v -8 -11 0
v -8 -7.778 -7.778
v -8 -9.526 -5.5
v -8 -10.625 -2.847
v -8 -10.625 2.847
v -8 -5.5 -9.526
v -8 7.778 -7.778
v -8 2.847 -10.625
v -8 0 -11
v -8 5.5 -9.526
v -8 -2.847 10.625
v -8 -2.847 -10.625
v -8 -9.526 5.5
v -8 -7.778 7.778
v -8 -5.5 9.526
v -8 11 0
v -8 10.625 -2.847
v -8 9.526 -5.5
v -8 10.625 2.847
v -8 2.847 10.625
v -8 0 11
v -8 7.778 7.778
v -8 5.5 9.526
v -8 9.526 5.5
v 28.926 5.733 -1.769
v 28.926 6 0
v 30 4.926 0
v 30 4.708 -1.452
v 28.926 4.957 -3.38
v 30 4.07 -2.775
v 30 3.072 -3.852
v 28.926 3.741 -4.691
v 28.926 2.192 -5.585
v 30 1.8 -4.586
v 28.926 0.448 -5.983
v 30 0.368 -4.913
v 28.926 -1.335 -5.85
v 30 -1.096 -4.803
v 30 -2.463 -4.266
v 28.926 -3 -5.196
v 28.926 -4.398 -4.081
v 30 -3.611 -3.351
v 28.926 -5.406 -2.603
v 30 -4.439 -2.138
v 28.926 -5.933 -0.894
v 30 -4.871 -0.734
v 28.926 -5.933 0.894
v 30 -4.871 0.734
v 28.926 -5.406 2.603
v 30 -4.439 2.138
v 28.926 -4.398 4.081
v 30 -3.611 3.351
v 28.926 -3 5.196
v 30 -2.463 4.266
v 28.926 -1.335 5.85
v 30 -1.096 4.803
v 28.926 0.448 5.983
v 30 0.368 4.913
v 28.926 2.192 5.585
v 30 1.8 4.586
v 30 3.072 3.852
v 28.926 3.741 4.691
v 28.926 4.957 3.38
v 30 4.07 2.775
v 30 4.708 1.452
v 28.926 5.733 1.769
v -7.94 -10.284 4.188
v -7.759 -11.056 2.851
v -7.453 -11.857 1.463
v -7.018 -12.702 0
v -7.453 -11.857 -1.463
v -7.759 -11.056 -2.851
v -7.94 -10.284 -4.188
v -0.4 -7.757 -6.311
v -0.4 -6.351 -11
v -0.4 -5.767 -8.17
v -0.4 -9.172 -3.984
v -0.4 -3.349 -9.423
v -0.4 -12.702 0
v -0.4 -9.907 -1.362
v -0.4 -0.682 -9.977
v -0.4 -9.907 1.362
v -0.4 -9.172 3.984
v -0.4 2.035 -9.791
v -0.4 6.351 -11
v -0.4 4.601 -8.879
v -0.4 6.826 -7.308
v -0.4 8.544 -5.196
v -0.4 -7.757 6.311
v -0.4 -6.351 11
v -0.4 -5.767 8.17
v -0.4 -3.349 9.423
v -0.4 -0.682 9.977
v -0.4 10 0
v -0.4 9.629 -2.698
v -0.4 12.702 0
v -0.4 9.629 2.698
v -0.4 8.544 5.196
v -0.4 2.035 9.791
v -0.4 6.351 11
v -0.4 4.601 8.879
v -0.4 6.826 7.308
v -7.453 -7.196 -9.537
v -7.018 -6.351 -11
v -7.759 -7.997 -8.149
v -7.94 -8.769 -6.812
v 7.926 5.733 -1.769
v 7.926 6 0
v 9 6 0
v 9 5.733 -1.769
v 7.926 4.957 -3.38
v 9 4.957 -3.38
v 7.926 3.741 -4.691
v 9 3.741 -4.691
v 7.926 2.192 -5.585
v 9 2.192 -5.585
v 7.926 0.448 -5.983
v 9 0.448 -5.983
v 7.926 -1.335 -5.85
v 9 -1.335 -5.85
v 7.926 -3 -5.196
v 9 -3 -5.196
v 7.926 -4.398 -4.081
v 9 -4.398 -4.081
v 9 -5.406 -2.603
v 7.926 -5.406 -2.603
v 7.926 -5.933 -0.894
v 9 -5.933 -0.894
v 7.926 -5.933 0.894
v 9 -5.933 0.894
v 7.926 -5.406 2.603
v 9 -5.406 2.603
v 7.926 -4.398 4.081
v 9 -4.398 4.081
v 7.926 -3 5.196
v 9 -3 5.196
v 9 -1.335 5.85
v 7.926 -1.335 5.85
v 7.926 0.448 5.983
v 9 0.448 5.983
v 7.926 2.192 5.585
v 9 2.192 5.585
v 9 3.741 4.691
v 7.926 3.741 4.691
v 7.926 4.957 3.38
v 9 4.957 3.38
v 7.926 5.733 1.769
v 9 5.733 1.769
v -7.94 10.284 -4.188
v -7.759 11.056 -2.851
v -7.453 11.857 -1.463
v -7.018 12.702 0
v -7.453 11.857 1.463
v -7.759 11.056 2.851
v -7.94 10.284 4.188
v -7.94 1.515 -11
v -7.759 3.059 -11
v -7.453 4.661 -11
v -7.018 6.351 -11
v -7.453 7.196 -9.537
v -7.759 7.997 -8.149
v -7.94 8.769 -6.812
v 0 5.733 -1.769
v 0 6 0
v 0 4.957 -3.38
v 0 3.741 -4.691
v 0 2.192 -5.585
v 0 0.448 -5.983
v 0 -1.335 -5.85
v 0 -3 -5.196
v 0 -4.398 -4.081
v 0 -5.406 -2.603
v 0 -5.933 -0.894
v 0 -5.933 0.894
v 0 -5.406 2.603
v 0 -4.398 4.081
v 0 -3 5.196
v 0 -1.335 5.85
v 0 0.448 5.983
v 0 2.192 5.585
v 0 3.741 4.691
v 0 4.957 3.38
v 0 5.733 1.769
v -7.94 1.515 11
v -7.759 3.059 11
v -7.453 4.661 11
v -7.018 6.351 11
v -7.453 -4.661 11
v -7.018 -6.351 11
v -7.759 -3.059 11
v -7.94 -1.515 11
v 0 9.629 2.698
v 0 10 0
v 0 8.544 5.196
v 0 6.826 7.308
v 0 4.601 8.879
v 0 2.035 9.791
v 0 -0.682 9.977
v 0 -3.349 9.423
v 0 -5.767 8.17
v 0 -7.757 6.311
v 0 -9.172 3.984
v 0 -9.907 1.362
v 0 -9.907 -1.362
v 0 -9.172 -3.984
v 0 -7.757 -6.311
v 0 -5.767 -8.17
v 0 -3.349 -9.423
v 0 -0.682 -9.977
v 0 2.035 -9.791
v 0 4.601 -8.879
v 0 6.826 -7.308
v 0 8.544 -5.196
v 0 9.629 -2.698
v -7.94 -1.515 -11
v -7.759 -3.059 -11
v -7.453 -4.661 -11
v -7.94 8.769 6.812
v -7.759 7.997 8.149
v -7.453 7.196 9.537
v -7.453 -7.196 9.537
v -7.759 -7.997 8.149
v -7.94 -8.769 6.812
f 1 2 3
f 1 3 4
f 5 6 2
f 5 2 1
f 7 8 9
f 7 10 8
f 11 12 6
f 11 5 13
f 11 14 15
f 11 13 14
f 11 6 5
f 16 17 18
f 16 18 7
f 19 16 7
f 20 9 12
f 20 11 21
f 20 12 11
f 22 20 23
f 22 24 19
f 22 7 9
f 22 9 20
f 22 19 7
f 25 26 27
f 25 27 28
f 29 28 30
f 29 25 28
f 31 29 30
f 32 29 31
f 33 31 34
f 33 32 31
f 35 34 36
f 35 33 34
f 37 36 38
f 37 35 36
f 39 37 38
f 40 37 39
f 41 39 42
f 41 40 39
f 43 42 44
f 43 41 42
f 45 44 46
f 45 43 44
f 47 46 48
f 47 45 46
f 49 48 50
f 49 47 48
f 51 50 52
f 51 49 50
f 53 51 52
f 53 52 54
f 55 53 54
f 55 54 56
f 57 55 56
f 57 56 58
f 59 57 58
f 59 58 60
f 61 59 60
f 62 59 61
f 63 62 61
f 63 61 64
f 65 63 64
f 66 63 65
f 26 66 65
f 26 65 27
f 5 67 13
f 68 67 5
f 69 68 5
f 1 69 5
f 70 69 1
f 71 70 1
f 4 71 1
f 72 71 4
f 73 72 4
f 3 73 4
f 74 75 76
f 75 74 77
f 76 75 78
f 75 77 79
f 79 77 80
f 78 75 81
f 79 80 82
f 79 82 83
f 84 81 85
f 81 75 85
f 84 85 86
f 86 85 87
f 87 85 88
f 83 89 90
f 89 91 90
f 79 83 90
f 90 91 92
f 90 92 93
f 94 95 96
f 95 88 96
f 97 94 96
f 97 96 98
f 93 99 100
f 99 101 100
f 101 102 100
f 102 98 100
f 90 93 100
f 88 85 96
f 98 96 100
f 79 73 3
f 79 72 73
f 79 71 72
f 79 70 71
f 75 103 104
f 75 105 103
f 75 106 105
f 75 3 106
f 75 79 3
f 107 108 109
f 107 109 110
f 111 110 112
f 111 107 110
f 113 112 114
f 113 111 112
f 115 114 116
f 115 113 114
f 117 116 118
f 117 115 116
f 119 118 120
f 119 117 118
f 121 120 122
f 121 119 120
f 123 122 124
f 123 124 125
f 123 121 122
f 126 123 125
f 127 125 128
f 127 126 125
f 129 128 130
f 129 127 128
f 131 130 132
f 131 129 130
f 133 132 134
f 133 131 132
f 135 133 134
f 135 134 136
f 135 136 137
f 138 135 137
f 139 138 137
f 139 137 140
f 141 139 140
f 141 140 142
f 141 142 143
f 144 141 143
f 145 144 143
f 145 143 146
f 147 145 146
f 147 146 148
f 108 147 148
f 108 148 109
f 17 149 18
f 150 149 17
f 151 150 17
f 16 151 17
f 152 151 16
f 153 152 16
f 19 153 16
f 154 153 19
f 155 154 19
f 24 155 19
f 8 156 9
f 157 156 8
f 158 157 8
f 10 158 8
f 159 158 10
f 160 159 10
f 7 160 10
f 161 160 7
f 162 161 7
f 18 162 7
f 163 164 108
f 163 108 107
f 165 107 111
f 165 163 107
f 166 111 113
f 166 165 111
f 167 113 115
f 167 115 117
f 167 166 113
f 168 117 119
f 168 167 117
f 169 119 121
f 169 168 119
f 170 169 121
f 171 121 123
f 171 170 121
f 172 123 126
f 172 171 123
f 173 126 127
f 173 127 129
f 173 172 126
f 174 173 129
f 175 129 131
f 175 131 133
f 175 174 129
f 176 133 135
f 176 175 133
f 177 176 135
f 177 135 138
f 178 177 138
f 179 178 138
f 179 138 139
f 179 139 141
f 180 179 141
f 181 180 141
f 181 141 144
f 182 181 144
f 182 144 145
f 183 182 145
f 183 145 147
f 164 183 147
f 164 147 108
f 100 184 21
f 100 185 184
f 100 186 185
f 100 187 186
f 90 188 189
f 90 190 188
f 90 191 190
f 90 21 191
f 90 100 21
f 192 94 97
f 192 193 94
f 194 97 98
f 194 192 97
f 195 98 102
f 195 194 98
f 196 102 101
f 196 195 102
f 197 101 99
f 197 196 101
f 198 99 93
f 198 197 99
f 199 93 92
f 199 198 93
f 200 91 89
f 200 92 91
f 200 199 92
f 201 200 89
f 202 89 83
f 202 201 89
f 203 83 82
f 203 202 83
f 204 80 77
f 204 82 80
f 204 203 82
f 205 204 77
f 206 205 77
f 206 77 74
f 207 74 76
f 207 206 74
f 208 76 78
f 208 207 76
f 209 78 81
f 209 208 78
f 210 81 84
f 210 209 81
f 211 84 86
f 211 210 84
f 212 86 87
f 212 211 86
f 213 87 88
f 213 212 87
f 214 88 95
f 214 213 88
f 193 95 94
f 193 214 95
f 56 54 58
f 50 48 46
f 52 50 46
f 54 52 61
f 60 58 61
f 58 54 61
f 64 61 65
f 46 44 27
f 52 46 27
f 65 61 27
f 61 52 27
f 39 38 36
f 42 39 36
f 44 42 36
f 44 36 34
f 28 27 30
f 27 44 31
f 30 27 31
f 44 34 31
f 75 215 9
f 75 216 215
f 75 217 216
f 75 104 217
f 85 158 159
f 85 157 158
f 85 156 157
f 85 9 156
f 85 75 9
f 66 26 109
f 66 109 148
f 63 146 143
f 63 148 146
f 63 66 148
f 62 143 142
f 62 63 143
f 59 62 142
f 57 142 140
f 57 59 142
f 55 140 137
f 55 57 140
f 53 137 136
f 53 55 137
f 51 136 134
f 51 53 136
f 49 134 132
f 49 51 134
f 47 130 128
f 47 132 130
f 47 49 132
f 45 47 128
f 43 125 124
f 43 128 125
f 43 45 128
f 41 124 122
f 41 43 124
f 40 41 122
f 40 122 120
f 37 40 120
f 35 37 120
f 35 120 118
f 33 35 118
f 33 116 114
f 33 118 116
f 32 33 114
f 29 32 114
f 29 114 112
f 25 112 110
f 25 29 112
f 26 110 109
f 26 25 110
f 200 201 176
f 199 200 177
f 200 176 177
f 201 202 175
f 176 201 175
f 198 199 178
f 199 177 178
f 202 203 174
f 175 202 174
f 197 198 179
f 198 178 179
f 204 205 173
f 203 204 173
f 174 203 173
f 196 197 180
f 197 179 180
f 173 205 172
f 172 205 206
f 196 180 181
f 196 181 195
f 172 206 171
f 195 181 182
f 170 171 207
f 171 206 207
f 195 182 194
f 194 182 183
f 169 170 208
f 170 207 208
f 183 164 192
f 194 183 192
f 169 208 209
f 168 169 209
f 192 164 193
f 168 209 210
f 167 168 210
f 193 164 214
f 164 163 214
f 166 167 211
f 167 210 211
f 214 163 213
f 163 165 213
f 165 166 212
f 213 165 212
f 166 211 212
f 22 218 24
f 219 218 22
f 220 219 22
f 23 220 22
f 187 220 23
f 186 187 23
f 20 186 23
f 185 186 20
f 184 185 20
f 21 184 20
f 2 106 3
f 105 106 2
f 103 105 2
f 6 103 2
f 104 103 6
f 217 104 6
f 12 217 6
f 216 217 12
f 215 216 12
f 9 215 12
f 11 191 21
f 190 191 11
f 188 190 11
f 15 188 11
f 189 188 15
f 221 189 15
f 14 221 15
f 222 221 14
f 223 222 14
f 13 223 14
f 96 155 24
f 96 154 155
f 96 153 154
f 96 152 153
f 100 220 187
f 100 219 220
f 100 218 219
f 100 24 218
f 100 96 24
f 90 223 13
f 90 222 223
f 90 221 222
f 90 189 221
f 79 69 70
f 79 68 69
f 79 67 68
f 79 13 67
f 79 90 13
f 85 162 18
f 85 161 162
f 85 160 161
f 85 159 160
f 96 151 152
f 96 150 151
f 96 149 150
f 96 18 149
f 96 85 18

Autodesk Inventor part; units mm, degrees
ref_plane "YZ Plane" through (0, 0, 0) normal (1, 0, 0) x (0, 1, 0)
ref_plane "XZ Plane" through (0, 0, 0) normal (0, 1, 0) x (-1, 0, 0)
sketch "Sketch1" plane through (0, 0, 0) normal (0, 0, 1) x (1, 0, 0)
  line L0 (0, 10) -> (0, 6)
  line L1 (9, 6) -> (30, 6)
  line L2 (30, 6) -> (30, 0)
  line L3 (30, 0) -> (-0.4001, 0)
  line L4 (-6.4801, 0) -> (36.08, 0) projected
  line L5 (-0.4001, 0) -> (-0.4001, 10)
  line L6 (-0.4001, 10) -> (0, 10)
  line L7 (9, 6) -> (7.9264, 6)
  line L8 (7.9264, 6) -> (0, 6)
  line L9 (0, -2) -> (0, 12) projected
  dimension "d0" = 30
  dimension "d1" = 21
  dimension "d2" = 12
  dimension "d9" = 0.4001
  dimension "d10" = 20
  dimension "d13" = 1.0736
  dimension "d14" = 12
revolve "Body" add sketch "Sketch1" angle 360 about axis through (30, 0, 0) along (-1, 0, 0)
sketch "Sketch2" plane through (-0.4001, 0, 0) normal (-1, 0, 0) x (0, 0, 1)
  line L0 (0, 12.7017) -> (11, 6.3509)
  line L1 (11, 6.3509) -> (11, -6.3509)
  line L2 (11, -6.3509) -> (0, -12.7017)
  line L3 (0, -12.7017) -> (-11, -6.3509)
  line L4 (-11, -6.3509) -> (-11, 6.3509)
  line L5 (-11, 6.3509) -> (0, 12.7017)
  point P0 (0, 0)
  point P1 (0, 0)
  dimension "d11" = 22
extrude "Head" add sketch "Sketch2" along normal blind 7.6
sketch "Sketch4" plane through (0, 0, 0) normal (0, 0, 1) x (1, 0, 0)
  line L0 (-8.0001, 11) -> (-8.0001, 12.7017)
  line L1 (-8.0001, 12.7017) -> (-7.0176, 12.7017)
  line L2 (-7.0176, 12.7017) -> (-8.0001, 11)
  line L3 (-9.5201, 0) -> (1.1199, 0) projected
  line L4 (-0.4001, 12.7017) -> (-8.0001, 12.7017) projected
  line L5 (-8.0001, 6.3509) -> (-8.0001, 12.7017) projected
  dimension "d5" = 30
  dimension "d19" = 22
revolve "Chamfer1" cut sketch "Sketch4" angle 360 about axis through (-10, 0, 0) along (1, 0, 0)
thread "Thread" size "M12x1.75" class "6g" standard "ISO Metric profile" length 21
chamfer "Chamfer2" distance 1.0735 distance2 1.0736 1 edges at (30, -6, 0) measured on face at (30, -2.3028, 0.7984)
ref_plane "Work Plane1" through (1.525, 0, 0) normal (0, 0, 1) x (1, 0, 0)
equation "\"d0\" = NLG"
equation "\"d1\" = GEL"
equation "\"d2\" = GD"
equation "\"d10\" = SD2"
equation "\"d14\" = BDM"
equation "\"d11\" = SW"
equation "\"d3\" = KOH - SD"
equation "\"d5\" = ANG1"
equation "\"d19\" = SW0"
equation "\"d15\" = GEL"
equation "\"d6\" = -0.5 * SPD + 0.5 * GD"
equation "\"NLG\" = 30"
equation "\"GD\" = NND"
equation "\"BDM\" = NND"
equation "\"KOH\" = 8"
equation "\"GEL\" = 21"
equation "\"SW\" = 22"
equation "\"SW0\" = SW"
equation "\"SPD\" = NND - 1.2269 * PTC"
equation "\"SD2\" = SDH"
equation "\"SD\" = 0.4"
equation "\"ANG1\" = 30deg"
equation "\"GAL\" = 0.61345 * PTC"
equation "\"GUL\" = 0.61345 * PTC"
equation "\"RR\" = 1.2"
equation "\"WFT\" = 0.4"
equation "\"GD1\" = THREADDIA - 1.2269 * PTC"
equation "\"THREADDIA\" = 12"
equation "\"TOA\" = 30deg"
equation "\"FAWI\" = 45deg"
equation "\"PTC\" = 1.75"
equation "\"NND\" = 12"
equation "\"E0\" = 1.155 * SW"
equation "\"K1\" = 5.28"
equation "\"SDH\" = 20"
properties part number "DIN 6914 - M12 x 30" material "Steel, Mild"
